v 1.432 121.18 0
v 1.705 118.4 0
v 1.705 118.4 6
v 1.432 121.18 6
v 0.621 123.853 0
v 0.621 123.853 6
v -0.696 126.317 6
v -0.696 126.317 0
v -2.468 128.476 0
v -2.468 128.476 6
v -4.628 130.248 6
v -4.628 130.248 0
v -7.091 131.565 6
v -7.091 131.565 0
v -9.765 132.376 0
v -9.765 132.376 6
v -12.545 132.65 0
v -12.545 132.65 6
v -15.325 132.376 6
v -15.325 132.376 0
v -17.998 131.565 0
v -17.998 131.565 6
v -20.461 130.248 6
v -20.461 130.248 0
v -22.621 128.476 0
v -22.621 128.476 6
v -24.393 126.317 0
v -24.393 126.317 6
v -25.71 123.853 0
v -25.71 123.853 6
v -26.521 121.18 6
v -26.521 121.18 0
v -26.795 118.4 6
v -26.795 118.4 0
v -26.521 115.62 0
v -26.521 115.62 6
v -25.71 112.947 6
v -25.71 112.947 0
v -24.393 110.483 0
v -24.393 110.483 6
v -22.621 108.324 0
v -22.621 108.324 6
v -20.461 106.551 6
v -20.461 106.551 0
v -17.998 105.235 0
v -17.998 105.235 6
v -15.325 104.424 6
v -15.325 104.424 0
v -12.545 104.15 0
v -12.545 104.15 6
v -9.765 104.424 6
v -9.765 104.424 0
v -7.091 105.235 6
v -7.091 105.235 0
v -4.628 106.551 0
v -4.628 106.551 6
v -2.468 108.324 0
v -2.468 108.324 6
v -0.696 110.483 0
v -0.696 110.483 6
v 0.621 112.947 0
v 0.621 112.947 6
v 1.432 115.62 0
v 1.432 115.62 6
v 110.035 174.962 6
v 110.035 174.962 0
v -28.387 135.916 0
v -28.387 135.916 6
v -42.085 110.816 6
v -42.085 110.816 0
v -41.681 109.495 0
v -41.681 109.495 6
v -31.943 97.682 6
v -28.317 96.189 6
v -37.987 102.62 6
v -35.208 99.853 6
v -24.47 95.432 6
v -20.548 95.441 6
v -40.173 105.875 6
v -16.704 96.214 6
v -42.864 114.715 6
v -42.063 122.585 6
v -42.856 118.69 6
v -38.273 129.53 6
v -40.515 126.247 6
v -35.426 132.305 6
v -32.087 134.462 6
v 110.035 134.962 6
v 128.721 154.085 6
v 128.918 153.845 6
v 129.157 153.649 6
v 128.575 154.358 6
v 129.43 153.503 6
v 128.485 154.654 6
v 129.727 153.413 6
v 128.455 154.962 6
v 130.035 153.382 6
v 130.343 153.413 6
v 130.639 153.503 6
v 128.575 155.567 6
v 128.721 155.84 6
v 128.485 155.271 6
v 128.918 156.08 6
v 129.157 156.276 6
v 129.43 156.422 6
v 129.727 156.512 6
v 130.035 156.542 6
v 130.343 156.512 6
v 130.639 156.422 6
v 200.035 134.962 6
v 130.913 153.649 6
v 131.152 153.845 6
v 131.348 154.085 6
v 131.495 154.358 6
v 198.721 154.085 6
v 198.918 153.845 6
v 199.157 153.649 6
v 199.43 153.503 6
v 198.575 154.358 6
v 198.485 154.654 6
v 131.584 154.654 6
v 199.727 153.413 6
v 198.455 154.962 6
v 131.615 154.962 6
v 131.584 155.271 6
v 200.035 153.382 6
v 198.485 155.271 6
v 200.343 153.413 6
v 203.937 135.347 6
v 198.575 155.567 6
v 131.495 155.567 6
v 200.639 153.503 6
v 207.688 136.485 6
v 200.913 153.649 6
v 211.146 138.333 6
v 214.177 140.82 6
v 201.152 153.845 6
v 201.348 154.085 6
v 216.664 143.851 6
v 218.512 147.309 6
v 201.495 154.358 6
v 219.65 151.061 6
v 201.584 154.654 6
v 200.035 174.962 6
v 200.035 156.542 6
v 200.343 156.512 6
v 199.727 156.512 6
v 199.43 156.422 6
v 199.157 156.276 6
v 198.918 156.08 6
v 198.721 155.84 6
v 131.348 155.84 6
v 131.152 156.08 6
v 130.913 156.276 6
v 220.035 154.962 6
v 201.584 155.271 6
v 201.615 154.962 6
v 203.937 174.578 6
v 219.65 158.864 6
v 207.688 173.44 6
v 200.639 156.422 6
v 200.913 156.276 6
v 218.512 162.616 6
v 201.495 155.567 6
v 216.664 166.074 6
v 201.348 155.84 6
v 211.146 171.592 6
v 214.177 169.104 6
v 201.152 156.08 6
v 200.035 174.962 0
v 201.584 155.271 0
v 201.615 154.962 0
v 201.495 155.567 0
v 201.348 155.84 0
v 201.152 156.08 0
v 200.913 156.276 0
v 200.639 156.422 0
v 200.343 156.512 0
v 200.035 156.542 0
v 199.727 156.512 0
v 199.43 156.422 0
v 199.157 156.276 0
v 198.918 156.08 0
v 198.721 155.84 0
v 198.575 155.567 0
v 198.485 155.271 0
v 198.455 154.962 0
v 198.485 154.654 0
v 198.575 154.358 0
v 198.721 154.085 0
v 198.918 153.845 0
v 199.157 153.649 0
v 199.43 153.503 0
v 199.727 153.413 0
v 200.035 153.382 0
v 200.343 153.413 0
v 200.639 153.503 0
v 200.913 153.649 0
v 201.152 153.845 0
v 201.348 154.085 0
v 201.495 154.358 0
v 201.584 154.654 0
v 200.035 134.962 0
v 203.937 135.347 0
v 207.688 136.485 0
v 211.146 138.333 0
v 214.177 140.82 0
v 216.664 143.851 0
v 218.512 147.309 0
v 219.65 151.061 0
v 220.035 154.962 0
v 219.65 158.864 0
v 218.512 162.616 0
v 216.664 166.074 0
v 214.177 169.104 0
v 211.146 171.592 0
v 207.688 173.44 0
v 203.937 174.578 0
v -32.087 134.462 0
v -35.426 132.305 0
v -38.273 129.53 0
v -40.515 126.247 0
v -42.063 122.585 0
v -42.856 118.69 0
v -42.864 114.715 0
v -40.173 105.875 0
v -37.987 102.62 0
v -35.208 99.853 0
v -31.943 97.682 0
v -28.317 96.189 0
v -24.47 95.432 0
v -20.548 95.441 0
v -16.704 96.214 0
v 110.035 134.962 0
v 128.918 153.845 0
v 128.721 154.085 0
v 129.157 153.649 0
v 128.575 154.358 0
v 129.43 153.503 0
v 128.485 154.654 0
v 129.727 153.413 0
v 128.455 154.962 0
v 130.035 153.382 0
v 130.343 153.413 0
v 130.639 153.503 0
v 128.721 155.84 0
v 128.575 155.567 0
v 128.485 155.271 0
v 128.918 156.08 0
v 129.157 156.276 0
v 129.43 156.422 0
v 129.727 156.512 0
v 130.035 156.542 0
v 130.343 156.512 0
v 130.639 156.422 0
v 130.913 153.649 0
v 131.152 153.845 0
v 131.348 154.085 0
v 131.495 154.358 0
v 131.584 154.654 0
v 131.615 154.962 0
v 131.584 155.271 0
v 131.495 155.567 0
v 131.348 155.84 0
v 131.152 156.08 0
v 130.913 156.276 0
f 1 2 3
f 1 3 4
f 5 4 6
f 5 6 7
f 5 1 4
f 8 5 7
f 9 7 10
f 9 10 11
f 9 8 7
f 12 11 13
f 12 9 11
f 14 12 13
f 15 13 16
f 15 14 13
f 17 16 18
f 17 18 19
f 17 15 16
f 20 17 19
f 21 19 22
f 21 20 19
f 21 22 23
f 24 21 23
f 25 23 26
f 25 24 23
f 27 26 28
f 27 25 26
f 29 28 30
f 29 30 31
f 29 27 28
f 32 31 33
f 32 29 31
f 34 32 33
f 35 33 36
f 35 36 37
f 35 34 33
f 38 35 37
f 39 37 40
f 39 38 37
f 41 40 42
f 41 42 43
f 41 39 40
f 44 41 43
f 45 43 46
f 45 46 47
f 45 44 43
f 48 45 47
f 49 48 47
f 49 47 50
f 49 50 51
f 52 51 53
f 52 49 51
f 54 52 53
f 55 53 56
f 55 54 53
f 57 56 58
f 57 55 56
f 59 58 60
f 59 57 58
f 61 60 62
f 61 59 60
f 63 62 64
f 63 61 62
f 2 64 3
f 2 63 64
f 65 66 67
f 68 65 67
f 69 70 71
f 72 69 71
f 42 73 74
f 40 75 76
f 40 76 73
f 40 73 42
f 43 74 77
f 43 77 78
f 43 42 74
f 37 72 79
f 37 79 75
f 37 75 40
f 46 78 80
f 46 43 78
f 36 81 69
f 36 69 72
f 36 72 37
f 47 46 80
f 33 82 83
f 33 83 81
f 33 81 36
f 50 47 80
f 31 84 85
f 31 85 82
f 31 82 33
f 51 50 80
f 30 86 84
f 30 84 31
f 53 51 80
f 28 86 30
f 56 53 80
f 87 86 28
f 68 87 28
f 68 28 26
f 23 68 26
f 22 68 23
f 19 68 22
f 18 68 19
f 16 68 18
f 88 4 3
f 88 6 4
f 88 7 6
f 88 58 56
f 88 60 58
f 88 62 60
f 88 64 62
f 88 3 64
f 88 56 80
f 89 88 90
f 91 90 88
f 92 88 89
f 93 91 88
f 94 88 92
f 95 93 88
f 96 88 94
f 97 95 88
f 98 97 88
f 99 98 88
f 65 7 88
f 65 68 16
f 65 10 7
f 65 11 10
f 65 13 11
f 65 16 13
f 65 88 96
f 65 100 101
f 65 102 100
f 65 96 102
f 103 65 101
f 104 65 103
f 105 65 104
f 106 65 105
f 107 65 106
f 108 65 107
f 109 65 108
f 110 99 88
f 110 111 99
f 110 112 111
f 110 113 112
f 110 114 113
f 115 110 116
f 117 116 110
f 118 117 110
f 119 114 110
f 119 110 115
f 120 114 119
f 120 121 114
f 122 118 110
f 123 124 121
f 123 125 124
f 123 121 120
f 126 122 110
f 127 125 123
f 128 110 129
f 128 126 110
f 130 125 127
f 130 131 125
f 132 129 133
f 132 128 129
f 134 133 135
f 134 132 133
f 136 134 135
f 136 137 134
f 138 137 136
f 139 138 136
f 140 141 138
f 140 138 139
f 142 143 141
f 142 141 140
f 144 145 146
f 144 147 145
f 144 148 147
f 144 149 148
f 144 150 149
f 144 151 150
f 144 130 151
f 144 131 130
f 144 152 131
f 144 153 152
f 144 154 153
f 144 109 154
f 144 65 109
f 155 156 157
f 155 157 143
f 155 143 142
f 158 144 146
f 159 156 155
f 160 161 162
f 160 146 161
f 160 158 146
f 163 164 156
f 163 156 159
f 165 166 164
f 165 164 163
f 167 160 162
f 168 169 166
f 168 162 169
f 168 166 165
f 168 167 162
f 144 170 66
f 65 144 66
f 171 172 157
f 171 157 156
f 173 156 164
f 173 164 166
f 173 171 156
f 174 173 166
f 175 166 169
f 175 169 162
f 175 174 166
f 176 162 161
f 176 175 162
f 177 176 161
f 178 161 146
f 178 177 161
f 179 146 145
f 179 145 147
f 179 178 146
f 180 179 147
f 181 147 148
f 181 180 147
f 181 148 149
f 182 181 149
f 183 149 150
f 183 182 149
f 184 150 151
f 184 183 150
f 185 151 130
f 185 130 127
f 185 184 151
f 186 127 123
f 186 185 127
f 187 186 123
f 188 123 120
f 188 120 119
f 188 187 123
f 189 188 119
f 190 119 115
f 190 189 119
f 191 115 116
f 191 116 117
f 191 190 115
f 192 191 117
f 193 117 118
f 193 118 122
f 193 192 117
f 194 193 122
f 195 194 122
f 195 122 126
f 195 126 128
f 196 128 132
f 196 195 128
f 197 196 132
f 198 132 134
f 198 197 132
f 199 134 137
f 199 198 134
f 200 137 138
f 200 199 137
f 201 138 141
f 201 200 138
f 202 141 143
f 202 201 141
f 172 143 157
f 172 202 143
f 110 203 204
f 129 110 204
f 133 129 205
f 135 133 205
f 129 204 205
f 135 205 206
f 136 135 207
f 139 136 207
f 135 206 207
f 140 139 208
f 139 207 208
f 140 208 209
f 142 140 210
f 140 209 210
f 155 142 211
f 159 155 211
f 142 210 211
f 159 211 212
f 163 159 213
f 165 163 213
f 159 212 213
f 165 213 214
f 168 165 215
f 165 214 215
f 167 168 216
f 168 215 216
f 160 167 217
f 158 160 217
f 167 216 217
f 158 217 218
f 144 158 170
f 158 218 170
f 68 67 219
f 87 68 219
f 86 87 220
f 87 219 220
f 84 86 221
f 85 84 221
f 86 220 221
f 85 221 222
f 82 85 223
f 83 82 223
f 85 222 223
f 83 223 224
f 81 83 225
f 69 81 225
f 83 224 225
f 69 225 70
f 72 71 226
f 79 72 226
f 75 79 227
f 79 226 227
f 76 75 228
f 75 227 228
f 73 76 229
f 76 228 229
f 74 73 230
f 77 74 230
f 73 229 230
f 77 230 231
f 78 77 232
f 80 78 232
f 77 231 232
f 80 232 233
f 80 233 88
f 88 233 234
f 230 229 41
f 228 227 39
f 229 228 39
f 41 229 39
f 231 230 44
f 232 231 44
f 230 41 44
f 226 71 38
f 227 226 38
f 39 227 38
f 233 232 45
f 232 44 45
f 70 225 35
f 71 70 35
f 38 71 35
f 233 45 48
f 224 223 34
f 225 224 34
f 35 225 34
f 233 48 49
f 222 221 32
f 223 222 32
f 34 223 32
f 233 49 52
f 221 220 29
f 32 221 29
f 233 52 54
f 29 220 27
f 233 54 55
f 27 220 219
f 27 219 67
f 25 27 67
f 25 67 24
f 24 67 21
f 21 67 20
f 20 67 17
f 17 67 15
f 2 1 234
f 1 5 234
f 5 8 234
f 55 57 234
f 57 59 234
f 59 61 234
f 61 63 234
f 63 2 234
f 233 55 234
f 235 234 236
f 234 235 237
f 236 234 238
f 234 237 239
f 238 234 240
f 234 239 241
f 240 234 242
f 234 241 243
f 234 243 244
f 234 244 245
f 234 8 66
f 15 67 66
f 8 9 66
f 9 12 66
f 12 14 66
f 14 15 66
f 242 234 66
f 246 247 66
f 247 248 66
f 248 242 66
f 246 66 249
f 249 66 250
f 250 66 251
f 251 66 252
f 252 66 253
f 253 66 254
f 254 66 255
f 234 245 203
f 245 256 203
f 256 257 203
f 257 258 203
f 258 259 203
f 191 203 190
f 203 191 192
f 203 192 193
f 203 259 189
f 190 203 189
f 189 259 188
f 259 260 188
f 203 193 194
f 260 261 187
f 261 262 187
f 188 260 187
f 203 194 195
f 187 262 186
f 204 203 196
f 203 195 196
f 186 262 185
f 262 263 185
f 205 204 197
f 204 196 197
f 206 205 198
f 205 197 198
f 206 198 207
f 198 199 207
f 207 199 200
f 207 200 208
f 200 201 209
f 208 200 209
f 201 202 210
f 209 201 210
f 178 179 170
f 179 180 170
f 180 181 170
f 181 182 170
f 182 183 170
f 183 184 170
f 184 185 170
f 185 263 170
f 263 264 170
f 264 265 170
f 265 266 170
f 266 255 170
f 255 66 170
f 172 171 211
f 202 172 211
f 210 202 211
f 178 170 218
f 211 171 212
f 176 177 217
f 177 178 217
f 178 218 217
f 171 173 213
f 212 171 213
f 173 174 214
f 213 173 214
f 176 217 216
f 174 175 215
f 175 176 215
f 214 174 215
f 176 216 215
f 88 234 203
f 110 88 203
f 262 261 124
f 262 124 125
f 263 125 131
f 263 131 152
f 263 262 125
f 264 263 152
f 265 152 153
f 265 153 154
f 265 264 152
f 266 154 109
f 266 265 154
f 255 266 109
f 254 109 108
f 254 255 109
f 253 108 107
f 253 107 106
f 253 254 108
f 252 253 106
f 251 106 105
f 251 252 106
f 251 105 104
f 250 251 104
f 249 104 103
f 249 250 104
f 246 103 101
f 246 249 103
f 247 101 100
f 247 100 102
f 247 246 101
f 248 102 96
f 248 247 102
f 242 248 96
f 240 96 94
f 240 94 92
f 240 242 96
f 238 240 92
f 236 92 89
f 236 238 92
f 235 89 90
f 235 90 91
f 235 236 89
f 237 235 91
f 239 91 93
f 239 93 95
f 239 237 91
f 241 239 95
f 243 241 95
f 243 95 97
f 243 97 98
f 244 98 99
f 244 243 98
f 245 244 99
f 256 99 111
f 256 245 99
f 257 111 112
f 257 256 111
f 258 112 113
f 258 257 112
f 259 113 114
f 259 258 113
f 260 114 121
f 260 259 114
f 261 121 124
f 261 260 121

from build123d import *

# Parameters (mm, degrees)
CROQUIS1_R              = 14.25
CROQUIS1_R_2            = 1.58
SALIENTE_EXTRUIR1_DEPTH = 6


with BuildPart() as part:
    # Croquis1 → Saliente-Extruir1 (new body)
    with BuildSketch(Plane.XY):
        with BuildLine():
            Line((110.034775737, 174.96231782), (-28.386947122, 135.91609695))
            ThreePointArc((-28.386947122, 135.91609695), (-40.514665945, 126.246932811), (-42.085274513, 110.816200885))
            Line((-42.085274513, 110.816200885), (-41.681314374, 109.494906807))
            ThreePointArc((-41.681314374, 109.494906807), (-31.943245693, 97.681684863), (-16.704181948, 96.21432992))
            Line((-16.704181948, 96.21432992), (110.034775737, 134.96231782))
            Line((110.034775737, 134.96231782), (200.034775737, 134.96231782))
            ThreePointArc((200.034775737, 134.96231782), (220.034775737, 154.96231782), (200.034775737, 174.96231782))
            Line((200.034775737, 174.96231782), (110.034775737, 174.96231782))
        make_face()
        with Locations((-12.544553236, 118.39989117)):
            Circle(CROQUIS1_R, mode=Mode.SUBTRACT)
        with Locations((200.034775737, 154.96231782)):
            Circle(CROQUIS1_R_2, mode=Mode.SUBTRACT)
        with Locations((130.034775737, 154.96231782)):
            Circle(CROQUIS1_R_2, mode=Mode.SUBTRACT)
    extrude(amount=SALIENTE_EXTRUIR1_DEPTH)


solid = part.part
